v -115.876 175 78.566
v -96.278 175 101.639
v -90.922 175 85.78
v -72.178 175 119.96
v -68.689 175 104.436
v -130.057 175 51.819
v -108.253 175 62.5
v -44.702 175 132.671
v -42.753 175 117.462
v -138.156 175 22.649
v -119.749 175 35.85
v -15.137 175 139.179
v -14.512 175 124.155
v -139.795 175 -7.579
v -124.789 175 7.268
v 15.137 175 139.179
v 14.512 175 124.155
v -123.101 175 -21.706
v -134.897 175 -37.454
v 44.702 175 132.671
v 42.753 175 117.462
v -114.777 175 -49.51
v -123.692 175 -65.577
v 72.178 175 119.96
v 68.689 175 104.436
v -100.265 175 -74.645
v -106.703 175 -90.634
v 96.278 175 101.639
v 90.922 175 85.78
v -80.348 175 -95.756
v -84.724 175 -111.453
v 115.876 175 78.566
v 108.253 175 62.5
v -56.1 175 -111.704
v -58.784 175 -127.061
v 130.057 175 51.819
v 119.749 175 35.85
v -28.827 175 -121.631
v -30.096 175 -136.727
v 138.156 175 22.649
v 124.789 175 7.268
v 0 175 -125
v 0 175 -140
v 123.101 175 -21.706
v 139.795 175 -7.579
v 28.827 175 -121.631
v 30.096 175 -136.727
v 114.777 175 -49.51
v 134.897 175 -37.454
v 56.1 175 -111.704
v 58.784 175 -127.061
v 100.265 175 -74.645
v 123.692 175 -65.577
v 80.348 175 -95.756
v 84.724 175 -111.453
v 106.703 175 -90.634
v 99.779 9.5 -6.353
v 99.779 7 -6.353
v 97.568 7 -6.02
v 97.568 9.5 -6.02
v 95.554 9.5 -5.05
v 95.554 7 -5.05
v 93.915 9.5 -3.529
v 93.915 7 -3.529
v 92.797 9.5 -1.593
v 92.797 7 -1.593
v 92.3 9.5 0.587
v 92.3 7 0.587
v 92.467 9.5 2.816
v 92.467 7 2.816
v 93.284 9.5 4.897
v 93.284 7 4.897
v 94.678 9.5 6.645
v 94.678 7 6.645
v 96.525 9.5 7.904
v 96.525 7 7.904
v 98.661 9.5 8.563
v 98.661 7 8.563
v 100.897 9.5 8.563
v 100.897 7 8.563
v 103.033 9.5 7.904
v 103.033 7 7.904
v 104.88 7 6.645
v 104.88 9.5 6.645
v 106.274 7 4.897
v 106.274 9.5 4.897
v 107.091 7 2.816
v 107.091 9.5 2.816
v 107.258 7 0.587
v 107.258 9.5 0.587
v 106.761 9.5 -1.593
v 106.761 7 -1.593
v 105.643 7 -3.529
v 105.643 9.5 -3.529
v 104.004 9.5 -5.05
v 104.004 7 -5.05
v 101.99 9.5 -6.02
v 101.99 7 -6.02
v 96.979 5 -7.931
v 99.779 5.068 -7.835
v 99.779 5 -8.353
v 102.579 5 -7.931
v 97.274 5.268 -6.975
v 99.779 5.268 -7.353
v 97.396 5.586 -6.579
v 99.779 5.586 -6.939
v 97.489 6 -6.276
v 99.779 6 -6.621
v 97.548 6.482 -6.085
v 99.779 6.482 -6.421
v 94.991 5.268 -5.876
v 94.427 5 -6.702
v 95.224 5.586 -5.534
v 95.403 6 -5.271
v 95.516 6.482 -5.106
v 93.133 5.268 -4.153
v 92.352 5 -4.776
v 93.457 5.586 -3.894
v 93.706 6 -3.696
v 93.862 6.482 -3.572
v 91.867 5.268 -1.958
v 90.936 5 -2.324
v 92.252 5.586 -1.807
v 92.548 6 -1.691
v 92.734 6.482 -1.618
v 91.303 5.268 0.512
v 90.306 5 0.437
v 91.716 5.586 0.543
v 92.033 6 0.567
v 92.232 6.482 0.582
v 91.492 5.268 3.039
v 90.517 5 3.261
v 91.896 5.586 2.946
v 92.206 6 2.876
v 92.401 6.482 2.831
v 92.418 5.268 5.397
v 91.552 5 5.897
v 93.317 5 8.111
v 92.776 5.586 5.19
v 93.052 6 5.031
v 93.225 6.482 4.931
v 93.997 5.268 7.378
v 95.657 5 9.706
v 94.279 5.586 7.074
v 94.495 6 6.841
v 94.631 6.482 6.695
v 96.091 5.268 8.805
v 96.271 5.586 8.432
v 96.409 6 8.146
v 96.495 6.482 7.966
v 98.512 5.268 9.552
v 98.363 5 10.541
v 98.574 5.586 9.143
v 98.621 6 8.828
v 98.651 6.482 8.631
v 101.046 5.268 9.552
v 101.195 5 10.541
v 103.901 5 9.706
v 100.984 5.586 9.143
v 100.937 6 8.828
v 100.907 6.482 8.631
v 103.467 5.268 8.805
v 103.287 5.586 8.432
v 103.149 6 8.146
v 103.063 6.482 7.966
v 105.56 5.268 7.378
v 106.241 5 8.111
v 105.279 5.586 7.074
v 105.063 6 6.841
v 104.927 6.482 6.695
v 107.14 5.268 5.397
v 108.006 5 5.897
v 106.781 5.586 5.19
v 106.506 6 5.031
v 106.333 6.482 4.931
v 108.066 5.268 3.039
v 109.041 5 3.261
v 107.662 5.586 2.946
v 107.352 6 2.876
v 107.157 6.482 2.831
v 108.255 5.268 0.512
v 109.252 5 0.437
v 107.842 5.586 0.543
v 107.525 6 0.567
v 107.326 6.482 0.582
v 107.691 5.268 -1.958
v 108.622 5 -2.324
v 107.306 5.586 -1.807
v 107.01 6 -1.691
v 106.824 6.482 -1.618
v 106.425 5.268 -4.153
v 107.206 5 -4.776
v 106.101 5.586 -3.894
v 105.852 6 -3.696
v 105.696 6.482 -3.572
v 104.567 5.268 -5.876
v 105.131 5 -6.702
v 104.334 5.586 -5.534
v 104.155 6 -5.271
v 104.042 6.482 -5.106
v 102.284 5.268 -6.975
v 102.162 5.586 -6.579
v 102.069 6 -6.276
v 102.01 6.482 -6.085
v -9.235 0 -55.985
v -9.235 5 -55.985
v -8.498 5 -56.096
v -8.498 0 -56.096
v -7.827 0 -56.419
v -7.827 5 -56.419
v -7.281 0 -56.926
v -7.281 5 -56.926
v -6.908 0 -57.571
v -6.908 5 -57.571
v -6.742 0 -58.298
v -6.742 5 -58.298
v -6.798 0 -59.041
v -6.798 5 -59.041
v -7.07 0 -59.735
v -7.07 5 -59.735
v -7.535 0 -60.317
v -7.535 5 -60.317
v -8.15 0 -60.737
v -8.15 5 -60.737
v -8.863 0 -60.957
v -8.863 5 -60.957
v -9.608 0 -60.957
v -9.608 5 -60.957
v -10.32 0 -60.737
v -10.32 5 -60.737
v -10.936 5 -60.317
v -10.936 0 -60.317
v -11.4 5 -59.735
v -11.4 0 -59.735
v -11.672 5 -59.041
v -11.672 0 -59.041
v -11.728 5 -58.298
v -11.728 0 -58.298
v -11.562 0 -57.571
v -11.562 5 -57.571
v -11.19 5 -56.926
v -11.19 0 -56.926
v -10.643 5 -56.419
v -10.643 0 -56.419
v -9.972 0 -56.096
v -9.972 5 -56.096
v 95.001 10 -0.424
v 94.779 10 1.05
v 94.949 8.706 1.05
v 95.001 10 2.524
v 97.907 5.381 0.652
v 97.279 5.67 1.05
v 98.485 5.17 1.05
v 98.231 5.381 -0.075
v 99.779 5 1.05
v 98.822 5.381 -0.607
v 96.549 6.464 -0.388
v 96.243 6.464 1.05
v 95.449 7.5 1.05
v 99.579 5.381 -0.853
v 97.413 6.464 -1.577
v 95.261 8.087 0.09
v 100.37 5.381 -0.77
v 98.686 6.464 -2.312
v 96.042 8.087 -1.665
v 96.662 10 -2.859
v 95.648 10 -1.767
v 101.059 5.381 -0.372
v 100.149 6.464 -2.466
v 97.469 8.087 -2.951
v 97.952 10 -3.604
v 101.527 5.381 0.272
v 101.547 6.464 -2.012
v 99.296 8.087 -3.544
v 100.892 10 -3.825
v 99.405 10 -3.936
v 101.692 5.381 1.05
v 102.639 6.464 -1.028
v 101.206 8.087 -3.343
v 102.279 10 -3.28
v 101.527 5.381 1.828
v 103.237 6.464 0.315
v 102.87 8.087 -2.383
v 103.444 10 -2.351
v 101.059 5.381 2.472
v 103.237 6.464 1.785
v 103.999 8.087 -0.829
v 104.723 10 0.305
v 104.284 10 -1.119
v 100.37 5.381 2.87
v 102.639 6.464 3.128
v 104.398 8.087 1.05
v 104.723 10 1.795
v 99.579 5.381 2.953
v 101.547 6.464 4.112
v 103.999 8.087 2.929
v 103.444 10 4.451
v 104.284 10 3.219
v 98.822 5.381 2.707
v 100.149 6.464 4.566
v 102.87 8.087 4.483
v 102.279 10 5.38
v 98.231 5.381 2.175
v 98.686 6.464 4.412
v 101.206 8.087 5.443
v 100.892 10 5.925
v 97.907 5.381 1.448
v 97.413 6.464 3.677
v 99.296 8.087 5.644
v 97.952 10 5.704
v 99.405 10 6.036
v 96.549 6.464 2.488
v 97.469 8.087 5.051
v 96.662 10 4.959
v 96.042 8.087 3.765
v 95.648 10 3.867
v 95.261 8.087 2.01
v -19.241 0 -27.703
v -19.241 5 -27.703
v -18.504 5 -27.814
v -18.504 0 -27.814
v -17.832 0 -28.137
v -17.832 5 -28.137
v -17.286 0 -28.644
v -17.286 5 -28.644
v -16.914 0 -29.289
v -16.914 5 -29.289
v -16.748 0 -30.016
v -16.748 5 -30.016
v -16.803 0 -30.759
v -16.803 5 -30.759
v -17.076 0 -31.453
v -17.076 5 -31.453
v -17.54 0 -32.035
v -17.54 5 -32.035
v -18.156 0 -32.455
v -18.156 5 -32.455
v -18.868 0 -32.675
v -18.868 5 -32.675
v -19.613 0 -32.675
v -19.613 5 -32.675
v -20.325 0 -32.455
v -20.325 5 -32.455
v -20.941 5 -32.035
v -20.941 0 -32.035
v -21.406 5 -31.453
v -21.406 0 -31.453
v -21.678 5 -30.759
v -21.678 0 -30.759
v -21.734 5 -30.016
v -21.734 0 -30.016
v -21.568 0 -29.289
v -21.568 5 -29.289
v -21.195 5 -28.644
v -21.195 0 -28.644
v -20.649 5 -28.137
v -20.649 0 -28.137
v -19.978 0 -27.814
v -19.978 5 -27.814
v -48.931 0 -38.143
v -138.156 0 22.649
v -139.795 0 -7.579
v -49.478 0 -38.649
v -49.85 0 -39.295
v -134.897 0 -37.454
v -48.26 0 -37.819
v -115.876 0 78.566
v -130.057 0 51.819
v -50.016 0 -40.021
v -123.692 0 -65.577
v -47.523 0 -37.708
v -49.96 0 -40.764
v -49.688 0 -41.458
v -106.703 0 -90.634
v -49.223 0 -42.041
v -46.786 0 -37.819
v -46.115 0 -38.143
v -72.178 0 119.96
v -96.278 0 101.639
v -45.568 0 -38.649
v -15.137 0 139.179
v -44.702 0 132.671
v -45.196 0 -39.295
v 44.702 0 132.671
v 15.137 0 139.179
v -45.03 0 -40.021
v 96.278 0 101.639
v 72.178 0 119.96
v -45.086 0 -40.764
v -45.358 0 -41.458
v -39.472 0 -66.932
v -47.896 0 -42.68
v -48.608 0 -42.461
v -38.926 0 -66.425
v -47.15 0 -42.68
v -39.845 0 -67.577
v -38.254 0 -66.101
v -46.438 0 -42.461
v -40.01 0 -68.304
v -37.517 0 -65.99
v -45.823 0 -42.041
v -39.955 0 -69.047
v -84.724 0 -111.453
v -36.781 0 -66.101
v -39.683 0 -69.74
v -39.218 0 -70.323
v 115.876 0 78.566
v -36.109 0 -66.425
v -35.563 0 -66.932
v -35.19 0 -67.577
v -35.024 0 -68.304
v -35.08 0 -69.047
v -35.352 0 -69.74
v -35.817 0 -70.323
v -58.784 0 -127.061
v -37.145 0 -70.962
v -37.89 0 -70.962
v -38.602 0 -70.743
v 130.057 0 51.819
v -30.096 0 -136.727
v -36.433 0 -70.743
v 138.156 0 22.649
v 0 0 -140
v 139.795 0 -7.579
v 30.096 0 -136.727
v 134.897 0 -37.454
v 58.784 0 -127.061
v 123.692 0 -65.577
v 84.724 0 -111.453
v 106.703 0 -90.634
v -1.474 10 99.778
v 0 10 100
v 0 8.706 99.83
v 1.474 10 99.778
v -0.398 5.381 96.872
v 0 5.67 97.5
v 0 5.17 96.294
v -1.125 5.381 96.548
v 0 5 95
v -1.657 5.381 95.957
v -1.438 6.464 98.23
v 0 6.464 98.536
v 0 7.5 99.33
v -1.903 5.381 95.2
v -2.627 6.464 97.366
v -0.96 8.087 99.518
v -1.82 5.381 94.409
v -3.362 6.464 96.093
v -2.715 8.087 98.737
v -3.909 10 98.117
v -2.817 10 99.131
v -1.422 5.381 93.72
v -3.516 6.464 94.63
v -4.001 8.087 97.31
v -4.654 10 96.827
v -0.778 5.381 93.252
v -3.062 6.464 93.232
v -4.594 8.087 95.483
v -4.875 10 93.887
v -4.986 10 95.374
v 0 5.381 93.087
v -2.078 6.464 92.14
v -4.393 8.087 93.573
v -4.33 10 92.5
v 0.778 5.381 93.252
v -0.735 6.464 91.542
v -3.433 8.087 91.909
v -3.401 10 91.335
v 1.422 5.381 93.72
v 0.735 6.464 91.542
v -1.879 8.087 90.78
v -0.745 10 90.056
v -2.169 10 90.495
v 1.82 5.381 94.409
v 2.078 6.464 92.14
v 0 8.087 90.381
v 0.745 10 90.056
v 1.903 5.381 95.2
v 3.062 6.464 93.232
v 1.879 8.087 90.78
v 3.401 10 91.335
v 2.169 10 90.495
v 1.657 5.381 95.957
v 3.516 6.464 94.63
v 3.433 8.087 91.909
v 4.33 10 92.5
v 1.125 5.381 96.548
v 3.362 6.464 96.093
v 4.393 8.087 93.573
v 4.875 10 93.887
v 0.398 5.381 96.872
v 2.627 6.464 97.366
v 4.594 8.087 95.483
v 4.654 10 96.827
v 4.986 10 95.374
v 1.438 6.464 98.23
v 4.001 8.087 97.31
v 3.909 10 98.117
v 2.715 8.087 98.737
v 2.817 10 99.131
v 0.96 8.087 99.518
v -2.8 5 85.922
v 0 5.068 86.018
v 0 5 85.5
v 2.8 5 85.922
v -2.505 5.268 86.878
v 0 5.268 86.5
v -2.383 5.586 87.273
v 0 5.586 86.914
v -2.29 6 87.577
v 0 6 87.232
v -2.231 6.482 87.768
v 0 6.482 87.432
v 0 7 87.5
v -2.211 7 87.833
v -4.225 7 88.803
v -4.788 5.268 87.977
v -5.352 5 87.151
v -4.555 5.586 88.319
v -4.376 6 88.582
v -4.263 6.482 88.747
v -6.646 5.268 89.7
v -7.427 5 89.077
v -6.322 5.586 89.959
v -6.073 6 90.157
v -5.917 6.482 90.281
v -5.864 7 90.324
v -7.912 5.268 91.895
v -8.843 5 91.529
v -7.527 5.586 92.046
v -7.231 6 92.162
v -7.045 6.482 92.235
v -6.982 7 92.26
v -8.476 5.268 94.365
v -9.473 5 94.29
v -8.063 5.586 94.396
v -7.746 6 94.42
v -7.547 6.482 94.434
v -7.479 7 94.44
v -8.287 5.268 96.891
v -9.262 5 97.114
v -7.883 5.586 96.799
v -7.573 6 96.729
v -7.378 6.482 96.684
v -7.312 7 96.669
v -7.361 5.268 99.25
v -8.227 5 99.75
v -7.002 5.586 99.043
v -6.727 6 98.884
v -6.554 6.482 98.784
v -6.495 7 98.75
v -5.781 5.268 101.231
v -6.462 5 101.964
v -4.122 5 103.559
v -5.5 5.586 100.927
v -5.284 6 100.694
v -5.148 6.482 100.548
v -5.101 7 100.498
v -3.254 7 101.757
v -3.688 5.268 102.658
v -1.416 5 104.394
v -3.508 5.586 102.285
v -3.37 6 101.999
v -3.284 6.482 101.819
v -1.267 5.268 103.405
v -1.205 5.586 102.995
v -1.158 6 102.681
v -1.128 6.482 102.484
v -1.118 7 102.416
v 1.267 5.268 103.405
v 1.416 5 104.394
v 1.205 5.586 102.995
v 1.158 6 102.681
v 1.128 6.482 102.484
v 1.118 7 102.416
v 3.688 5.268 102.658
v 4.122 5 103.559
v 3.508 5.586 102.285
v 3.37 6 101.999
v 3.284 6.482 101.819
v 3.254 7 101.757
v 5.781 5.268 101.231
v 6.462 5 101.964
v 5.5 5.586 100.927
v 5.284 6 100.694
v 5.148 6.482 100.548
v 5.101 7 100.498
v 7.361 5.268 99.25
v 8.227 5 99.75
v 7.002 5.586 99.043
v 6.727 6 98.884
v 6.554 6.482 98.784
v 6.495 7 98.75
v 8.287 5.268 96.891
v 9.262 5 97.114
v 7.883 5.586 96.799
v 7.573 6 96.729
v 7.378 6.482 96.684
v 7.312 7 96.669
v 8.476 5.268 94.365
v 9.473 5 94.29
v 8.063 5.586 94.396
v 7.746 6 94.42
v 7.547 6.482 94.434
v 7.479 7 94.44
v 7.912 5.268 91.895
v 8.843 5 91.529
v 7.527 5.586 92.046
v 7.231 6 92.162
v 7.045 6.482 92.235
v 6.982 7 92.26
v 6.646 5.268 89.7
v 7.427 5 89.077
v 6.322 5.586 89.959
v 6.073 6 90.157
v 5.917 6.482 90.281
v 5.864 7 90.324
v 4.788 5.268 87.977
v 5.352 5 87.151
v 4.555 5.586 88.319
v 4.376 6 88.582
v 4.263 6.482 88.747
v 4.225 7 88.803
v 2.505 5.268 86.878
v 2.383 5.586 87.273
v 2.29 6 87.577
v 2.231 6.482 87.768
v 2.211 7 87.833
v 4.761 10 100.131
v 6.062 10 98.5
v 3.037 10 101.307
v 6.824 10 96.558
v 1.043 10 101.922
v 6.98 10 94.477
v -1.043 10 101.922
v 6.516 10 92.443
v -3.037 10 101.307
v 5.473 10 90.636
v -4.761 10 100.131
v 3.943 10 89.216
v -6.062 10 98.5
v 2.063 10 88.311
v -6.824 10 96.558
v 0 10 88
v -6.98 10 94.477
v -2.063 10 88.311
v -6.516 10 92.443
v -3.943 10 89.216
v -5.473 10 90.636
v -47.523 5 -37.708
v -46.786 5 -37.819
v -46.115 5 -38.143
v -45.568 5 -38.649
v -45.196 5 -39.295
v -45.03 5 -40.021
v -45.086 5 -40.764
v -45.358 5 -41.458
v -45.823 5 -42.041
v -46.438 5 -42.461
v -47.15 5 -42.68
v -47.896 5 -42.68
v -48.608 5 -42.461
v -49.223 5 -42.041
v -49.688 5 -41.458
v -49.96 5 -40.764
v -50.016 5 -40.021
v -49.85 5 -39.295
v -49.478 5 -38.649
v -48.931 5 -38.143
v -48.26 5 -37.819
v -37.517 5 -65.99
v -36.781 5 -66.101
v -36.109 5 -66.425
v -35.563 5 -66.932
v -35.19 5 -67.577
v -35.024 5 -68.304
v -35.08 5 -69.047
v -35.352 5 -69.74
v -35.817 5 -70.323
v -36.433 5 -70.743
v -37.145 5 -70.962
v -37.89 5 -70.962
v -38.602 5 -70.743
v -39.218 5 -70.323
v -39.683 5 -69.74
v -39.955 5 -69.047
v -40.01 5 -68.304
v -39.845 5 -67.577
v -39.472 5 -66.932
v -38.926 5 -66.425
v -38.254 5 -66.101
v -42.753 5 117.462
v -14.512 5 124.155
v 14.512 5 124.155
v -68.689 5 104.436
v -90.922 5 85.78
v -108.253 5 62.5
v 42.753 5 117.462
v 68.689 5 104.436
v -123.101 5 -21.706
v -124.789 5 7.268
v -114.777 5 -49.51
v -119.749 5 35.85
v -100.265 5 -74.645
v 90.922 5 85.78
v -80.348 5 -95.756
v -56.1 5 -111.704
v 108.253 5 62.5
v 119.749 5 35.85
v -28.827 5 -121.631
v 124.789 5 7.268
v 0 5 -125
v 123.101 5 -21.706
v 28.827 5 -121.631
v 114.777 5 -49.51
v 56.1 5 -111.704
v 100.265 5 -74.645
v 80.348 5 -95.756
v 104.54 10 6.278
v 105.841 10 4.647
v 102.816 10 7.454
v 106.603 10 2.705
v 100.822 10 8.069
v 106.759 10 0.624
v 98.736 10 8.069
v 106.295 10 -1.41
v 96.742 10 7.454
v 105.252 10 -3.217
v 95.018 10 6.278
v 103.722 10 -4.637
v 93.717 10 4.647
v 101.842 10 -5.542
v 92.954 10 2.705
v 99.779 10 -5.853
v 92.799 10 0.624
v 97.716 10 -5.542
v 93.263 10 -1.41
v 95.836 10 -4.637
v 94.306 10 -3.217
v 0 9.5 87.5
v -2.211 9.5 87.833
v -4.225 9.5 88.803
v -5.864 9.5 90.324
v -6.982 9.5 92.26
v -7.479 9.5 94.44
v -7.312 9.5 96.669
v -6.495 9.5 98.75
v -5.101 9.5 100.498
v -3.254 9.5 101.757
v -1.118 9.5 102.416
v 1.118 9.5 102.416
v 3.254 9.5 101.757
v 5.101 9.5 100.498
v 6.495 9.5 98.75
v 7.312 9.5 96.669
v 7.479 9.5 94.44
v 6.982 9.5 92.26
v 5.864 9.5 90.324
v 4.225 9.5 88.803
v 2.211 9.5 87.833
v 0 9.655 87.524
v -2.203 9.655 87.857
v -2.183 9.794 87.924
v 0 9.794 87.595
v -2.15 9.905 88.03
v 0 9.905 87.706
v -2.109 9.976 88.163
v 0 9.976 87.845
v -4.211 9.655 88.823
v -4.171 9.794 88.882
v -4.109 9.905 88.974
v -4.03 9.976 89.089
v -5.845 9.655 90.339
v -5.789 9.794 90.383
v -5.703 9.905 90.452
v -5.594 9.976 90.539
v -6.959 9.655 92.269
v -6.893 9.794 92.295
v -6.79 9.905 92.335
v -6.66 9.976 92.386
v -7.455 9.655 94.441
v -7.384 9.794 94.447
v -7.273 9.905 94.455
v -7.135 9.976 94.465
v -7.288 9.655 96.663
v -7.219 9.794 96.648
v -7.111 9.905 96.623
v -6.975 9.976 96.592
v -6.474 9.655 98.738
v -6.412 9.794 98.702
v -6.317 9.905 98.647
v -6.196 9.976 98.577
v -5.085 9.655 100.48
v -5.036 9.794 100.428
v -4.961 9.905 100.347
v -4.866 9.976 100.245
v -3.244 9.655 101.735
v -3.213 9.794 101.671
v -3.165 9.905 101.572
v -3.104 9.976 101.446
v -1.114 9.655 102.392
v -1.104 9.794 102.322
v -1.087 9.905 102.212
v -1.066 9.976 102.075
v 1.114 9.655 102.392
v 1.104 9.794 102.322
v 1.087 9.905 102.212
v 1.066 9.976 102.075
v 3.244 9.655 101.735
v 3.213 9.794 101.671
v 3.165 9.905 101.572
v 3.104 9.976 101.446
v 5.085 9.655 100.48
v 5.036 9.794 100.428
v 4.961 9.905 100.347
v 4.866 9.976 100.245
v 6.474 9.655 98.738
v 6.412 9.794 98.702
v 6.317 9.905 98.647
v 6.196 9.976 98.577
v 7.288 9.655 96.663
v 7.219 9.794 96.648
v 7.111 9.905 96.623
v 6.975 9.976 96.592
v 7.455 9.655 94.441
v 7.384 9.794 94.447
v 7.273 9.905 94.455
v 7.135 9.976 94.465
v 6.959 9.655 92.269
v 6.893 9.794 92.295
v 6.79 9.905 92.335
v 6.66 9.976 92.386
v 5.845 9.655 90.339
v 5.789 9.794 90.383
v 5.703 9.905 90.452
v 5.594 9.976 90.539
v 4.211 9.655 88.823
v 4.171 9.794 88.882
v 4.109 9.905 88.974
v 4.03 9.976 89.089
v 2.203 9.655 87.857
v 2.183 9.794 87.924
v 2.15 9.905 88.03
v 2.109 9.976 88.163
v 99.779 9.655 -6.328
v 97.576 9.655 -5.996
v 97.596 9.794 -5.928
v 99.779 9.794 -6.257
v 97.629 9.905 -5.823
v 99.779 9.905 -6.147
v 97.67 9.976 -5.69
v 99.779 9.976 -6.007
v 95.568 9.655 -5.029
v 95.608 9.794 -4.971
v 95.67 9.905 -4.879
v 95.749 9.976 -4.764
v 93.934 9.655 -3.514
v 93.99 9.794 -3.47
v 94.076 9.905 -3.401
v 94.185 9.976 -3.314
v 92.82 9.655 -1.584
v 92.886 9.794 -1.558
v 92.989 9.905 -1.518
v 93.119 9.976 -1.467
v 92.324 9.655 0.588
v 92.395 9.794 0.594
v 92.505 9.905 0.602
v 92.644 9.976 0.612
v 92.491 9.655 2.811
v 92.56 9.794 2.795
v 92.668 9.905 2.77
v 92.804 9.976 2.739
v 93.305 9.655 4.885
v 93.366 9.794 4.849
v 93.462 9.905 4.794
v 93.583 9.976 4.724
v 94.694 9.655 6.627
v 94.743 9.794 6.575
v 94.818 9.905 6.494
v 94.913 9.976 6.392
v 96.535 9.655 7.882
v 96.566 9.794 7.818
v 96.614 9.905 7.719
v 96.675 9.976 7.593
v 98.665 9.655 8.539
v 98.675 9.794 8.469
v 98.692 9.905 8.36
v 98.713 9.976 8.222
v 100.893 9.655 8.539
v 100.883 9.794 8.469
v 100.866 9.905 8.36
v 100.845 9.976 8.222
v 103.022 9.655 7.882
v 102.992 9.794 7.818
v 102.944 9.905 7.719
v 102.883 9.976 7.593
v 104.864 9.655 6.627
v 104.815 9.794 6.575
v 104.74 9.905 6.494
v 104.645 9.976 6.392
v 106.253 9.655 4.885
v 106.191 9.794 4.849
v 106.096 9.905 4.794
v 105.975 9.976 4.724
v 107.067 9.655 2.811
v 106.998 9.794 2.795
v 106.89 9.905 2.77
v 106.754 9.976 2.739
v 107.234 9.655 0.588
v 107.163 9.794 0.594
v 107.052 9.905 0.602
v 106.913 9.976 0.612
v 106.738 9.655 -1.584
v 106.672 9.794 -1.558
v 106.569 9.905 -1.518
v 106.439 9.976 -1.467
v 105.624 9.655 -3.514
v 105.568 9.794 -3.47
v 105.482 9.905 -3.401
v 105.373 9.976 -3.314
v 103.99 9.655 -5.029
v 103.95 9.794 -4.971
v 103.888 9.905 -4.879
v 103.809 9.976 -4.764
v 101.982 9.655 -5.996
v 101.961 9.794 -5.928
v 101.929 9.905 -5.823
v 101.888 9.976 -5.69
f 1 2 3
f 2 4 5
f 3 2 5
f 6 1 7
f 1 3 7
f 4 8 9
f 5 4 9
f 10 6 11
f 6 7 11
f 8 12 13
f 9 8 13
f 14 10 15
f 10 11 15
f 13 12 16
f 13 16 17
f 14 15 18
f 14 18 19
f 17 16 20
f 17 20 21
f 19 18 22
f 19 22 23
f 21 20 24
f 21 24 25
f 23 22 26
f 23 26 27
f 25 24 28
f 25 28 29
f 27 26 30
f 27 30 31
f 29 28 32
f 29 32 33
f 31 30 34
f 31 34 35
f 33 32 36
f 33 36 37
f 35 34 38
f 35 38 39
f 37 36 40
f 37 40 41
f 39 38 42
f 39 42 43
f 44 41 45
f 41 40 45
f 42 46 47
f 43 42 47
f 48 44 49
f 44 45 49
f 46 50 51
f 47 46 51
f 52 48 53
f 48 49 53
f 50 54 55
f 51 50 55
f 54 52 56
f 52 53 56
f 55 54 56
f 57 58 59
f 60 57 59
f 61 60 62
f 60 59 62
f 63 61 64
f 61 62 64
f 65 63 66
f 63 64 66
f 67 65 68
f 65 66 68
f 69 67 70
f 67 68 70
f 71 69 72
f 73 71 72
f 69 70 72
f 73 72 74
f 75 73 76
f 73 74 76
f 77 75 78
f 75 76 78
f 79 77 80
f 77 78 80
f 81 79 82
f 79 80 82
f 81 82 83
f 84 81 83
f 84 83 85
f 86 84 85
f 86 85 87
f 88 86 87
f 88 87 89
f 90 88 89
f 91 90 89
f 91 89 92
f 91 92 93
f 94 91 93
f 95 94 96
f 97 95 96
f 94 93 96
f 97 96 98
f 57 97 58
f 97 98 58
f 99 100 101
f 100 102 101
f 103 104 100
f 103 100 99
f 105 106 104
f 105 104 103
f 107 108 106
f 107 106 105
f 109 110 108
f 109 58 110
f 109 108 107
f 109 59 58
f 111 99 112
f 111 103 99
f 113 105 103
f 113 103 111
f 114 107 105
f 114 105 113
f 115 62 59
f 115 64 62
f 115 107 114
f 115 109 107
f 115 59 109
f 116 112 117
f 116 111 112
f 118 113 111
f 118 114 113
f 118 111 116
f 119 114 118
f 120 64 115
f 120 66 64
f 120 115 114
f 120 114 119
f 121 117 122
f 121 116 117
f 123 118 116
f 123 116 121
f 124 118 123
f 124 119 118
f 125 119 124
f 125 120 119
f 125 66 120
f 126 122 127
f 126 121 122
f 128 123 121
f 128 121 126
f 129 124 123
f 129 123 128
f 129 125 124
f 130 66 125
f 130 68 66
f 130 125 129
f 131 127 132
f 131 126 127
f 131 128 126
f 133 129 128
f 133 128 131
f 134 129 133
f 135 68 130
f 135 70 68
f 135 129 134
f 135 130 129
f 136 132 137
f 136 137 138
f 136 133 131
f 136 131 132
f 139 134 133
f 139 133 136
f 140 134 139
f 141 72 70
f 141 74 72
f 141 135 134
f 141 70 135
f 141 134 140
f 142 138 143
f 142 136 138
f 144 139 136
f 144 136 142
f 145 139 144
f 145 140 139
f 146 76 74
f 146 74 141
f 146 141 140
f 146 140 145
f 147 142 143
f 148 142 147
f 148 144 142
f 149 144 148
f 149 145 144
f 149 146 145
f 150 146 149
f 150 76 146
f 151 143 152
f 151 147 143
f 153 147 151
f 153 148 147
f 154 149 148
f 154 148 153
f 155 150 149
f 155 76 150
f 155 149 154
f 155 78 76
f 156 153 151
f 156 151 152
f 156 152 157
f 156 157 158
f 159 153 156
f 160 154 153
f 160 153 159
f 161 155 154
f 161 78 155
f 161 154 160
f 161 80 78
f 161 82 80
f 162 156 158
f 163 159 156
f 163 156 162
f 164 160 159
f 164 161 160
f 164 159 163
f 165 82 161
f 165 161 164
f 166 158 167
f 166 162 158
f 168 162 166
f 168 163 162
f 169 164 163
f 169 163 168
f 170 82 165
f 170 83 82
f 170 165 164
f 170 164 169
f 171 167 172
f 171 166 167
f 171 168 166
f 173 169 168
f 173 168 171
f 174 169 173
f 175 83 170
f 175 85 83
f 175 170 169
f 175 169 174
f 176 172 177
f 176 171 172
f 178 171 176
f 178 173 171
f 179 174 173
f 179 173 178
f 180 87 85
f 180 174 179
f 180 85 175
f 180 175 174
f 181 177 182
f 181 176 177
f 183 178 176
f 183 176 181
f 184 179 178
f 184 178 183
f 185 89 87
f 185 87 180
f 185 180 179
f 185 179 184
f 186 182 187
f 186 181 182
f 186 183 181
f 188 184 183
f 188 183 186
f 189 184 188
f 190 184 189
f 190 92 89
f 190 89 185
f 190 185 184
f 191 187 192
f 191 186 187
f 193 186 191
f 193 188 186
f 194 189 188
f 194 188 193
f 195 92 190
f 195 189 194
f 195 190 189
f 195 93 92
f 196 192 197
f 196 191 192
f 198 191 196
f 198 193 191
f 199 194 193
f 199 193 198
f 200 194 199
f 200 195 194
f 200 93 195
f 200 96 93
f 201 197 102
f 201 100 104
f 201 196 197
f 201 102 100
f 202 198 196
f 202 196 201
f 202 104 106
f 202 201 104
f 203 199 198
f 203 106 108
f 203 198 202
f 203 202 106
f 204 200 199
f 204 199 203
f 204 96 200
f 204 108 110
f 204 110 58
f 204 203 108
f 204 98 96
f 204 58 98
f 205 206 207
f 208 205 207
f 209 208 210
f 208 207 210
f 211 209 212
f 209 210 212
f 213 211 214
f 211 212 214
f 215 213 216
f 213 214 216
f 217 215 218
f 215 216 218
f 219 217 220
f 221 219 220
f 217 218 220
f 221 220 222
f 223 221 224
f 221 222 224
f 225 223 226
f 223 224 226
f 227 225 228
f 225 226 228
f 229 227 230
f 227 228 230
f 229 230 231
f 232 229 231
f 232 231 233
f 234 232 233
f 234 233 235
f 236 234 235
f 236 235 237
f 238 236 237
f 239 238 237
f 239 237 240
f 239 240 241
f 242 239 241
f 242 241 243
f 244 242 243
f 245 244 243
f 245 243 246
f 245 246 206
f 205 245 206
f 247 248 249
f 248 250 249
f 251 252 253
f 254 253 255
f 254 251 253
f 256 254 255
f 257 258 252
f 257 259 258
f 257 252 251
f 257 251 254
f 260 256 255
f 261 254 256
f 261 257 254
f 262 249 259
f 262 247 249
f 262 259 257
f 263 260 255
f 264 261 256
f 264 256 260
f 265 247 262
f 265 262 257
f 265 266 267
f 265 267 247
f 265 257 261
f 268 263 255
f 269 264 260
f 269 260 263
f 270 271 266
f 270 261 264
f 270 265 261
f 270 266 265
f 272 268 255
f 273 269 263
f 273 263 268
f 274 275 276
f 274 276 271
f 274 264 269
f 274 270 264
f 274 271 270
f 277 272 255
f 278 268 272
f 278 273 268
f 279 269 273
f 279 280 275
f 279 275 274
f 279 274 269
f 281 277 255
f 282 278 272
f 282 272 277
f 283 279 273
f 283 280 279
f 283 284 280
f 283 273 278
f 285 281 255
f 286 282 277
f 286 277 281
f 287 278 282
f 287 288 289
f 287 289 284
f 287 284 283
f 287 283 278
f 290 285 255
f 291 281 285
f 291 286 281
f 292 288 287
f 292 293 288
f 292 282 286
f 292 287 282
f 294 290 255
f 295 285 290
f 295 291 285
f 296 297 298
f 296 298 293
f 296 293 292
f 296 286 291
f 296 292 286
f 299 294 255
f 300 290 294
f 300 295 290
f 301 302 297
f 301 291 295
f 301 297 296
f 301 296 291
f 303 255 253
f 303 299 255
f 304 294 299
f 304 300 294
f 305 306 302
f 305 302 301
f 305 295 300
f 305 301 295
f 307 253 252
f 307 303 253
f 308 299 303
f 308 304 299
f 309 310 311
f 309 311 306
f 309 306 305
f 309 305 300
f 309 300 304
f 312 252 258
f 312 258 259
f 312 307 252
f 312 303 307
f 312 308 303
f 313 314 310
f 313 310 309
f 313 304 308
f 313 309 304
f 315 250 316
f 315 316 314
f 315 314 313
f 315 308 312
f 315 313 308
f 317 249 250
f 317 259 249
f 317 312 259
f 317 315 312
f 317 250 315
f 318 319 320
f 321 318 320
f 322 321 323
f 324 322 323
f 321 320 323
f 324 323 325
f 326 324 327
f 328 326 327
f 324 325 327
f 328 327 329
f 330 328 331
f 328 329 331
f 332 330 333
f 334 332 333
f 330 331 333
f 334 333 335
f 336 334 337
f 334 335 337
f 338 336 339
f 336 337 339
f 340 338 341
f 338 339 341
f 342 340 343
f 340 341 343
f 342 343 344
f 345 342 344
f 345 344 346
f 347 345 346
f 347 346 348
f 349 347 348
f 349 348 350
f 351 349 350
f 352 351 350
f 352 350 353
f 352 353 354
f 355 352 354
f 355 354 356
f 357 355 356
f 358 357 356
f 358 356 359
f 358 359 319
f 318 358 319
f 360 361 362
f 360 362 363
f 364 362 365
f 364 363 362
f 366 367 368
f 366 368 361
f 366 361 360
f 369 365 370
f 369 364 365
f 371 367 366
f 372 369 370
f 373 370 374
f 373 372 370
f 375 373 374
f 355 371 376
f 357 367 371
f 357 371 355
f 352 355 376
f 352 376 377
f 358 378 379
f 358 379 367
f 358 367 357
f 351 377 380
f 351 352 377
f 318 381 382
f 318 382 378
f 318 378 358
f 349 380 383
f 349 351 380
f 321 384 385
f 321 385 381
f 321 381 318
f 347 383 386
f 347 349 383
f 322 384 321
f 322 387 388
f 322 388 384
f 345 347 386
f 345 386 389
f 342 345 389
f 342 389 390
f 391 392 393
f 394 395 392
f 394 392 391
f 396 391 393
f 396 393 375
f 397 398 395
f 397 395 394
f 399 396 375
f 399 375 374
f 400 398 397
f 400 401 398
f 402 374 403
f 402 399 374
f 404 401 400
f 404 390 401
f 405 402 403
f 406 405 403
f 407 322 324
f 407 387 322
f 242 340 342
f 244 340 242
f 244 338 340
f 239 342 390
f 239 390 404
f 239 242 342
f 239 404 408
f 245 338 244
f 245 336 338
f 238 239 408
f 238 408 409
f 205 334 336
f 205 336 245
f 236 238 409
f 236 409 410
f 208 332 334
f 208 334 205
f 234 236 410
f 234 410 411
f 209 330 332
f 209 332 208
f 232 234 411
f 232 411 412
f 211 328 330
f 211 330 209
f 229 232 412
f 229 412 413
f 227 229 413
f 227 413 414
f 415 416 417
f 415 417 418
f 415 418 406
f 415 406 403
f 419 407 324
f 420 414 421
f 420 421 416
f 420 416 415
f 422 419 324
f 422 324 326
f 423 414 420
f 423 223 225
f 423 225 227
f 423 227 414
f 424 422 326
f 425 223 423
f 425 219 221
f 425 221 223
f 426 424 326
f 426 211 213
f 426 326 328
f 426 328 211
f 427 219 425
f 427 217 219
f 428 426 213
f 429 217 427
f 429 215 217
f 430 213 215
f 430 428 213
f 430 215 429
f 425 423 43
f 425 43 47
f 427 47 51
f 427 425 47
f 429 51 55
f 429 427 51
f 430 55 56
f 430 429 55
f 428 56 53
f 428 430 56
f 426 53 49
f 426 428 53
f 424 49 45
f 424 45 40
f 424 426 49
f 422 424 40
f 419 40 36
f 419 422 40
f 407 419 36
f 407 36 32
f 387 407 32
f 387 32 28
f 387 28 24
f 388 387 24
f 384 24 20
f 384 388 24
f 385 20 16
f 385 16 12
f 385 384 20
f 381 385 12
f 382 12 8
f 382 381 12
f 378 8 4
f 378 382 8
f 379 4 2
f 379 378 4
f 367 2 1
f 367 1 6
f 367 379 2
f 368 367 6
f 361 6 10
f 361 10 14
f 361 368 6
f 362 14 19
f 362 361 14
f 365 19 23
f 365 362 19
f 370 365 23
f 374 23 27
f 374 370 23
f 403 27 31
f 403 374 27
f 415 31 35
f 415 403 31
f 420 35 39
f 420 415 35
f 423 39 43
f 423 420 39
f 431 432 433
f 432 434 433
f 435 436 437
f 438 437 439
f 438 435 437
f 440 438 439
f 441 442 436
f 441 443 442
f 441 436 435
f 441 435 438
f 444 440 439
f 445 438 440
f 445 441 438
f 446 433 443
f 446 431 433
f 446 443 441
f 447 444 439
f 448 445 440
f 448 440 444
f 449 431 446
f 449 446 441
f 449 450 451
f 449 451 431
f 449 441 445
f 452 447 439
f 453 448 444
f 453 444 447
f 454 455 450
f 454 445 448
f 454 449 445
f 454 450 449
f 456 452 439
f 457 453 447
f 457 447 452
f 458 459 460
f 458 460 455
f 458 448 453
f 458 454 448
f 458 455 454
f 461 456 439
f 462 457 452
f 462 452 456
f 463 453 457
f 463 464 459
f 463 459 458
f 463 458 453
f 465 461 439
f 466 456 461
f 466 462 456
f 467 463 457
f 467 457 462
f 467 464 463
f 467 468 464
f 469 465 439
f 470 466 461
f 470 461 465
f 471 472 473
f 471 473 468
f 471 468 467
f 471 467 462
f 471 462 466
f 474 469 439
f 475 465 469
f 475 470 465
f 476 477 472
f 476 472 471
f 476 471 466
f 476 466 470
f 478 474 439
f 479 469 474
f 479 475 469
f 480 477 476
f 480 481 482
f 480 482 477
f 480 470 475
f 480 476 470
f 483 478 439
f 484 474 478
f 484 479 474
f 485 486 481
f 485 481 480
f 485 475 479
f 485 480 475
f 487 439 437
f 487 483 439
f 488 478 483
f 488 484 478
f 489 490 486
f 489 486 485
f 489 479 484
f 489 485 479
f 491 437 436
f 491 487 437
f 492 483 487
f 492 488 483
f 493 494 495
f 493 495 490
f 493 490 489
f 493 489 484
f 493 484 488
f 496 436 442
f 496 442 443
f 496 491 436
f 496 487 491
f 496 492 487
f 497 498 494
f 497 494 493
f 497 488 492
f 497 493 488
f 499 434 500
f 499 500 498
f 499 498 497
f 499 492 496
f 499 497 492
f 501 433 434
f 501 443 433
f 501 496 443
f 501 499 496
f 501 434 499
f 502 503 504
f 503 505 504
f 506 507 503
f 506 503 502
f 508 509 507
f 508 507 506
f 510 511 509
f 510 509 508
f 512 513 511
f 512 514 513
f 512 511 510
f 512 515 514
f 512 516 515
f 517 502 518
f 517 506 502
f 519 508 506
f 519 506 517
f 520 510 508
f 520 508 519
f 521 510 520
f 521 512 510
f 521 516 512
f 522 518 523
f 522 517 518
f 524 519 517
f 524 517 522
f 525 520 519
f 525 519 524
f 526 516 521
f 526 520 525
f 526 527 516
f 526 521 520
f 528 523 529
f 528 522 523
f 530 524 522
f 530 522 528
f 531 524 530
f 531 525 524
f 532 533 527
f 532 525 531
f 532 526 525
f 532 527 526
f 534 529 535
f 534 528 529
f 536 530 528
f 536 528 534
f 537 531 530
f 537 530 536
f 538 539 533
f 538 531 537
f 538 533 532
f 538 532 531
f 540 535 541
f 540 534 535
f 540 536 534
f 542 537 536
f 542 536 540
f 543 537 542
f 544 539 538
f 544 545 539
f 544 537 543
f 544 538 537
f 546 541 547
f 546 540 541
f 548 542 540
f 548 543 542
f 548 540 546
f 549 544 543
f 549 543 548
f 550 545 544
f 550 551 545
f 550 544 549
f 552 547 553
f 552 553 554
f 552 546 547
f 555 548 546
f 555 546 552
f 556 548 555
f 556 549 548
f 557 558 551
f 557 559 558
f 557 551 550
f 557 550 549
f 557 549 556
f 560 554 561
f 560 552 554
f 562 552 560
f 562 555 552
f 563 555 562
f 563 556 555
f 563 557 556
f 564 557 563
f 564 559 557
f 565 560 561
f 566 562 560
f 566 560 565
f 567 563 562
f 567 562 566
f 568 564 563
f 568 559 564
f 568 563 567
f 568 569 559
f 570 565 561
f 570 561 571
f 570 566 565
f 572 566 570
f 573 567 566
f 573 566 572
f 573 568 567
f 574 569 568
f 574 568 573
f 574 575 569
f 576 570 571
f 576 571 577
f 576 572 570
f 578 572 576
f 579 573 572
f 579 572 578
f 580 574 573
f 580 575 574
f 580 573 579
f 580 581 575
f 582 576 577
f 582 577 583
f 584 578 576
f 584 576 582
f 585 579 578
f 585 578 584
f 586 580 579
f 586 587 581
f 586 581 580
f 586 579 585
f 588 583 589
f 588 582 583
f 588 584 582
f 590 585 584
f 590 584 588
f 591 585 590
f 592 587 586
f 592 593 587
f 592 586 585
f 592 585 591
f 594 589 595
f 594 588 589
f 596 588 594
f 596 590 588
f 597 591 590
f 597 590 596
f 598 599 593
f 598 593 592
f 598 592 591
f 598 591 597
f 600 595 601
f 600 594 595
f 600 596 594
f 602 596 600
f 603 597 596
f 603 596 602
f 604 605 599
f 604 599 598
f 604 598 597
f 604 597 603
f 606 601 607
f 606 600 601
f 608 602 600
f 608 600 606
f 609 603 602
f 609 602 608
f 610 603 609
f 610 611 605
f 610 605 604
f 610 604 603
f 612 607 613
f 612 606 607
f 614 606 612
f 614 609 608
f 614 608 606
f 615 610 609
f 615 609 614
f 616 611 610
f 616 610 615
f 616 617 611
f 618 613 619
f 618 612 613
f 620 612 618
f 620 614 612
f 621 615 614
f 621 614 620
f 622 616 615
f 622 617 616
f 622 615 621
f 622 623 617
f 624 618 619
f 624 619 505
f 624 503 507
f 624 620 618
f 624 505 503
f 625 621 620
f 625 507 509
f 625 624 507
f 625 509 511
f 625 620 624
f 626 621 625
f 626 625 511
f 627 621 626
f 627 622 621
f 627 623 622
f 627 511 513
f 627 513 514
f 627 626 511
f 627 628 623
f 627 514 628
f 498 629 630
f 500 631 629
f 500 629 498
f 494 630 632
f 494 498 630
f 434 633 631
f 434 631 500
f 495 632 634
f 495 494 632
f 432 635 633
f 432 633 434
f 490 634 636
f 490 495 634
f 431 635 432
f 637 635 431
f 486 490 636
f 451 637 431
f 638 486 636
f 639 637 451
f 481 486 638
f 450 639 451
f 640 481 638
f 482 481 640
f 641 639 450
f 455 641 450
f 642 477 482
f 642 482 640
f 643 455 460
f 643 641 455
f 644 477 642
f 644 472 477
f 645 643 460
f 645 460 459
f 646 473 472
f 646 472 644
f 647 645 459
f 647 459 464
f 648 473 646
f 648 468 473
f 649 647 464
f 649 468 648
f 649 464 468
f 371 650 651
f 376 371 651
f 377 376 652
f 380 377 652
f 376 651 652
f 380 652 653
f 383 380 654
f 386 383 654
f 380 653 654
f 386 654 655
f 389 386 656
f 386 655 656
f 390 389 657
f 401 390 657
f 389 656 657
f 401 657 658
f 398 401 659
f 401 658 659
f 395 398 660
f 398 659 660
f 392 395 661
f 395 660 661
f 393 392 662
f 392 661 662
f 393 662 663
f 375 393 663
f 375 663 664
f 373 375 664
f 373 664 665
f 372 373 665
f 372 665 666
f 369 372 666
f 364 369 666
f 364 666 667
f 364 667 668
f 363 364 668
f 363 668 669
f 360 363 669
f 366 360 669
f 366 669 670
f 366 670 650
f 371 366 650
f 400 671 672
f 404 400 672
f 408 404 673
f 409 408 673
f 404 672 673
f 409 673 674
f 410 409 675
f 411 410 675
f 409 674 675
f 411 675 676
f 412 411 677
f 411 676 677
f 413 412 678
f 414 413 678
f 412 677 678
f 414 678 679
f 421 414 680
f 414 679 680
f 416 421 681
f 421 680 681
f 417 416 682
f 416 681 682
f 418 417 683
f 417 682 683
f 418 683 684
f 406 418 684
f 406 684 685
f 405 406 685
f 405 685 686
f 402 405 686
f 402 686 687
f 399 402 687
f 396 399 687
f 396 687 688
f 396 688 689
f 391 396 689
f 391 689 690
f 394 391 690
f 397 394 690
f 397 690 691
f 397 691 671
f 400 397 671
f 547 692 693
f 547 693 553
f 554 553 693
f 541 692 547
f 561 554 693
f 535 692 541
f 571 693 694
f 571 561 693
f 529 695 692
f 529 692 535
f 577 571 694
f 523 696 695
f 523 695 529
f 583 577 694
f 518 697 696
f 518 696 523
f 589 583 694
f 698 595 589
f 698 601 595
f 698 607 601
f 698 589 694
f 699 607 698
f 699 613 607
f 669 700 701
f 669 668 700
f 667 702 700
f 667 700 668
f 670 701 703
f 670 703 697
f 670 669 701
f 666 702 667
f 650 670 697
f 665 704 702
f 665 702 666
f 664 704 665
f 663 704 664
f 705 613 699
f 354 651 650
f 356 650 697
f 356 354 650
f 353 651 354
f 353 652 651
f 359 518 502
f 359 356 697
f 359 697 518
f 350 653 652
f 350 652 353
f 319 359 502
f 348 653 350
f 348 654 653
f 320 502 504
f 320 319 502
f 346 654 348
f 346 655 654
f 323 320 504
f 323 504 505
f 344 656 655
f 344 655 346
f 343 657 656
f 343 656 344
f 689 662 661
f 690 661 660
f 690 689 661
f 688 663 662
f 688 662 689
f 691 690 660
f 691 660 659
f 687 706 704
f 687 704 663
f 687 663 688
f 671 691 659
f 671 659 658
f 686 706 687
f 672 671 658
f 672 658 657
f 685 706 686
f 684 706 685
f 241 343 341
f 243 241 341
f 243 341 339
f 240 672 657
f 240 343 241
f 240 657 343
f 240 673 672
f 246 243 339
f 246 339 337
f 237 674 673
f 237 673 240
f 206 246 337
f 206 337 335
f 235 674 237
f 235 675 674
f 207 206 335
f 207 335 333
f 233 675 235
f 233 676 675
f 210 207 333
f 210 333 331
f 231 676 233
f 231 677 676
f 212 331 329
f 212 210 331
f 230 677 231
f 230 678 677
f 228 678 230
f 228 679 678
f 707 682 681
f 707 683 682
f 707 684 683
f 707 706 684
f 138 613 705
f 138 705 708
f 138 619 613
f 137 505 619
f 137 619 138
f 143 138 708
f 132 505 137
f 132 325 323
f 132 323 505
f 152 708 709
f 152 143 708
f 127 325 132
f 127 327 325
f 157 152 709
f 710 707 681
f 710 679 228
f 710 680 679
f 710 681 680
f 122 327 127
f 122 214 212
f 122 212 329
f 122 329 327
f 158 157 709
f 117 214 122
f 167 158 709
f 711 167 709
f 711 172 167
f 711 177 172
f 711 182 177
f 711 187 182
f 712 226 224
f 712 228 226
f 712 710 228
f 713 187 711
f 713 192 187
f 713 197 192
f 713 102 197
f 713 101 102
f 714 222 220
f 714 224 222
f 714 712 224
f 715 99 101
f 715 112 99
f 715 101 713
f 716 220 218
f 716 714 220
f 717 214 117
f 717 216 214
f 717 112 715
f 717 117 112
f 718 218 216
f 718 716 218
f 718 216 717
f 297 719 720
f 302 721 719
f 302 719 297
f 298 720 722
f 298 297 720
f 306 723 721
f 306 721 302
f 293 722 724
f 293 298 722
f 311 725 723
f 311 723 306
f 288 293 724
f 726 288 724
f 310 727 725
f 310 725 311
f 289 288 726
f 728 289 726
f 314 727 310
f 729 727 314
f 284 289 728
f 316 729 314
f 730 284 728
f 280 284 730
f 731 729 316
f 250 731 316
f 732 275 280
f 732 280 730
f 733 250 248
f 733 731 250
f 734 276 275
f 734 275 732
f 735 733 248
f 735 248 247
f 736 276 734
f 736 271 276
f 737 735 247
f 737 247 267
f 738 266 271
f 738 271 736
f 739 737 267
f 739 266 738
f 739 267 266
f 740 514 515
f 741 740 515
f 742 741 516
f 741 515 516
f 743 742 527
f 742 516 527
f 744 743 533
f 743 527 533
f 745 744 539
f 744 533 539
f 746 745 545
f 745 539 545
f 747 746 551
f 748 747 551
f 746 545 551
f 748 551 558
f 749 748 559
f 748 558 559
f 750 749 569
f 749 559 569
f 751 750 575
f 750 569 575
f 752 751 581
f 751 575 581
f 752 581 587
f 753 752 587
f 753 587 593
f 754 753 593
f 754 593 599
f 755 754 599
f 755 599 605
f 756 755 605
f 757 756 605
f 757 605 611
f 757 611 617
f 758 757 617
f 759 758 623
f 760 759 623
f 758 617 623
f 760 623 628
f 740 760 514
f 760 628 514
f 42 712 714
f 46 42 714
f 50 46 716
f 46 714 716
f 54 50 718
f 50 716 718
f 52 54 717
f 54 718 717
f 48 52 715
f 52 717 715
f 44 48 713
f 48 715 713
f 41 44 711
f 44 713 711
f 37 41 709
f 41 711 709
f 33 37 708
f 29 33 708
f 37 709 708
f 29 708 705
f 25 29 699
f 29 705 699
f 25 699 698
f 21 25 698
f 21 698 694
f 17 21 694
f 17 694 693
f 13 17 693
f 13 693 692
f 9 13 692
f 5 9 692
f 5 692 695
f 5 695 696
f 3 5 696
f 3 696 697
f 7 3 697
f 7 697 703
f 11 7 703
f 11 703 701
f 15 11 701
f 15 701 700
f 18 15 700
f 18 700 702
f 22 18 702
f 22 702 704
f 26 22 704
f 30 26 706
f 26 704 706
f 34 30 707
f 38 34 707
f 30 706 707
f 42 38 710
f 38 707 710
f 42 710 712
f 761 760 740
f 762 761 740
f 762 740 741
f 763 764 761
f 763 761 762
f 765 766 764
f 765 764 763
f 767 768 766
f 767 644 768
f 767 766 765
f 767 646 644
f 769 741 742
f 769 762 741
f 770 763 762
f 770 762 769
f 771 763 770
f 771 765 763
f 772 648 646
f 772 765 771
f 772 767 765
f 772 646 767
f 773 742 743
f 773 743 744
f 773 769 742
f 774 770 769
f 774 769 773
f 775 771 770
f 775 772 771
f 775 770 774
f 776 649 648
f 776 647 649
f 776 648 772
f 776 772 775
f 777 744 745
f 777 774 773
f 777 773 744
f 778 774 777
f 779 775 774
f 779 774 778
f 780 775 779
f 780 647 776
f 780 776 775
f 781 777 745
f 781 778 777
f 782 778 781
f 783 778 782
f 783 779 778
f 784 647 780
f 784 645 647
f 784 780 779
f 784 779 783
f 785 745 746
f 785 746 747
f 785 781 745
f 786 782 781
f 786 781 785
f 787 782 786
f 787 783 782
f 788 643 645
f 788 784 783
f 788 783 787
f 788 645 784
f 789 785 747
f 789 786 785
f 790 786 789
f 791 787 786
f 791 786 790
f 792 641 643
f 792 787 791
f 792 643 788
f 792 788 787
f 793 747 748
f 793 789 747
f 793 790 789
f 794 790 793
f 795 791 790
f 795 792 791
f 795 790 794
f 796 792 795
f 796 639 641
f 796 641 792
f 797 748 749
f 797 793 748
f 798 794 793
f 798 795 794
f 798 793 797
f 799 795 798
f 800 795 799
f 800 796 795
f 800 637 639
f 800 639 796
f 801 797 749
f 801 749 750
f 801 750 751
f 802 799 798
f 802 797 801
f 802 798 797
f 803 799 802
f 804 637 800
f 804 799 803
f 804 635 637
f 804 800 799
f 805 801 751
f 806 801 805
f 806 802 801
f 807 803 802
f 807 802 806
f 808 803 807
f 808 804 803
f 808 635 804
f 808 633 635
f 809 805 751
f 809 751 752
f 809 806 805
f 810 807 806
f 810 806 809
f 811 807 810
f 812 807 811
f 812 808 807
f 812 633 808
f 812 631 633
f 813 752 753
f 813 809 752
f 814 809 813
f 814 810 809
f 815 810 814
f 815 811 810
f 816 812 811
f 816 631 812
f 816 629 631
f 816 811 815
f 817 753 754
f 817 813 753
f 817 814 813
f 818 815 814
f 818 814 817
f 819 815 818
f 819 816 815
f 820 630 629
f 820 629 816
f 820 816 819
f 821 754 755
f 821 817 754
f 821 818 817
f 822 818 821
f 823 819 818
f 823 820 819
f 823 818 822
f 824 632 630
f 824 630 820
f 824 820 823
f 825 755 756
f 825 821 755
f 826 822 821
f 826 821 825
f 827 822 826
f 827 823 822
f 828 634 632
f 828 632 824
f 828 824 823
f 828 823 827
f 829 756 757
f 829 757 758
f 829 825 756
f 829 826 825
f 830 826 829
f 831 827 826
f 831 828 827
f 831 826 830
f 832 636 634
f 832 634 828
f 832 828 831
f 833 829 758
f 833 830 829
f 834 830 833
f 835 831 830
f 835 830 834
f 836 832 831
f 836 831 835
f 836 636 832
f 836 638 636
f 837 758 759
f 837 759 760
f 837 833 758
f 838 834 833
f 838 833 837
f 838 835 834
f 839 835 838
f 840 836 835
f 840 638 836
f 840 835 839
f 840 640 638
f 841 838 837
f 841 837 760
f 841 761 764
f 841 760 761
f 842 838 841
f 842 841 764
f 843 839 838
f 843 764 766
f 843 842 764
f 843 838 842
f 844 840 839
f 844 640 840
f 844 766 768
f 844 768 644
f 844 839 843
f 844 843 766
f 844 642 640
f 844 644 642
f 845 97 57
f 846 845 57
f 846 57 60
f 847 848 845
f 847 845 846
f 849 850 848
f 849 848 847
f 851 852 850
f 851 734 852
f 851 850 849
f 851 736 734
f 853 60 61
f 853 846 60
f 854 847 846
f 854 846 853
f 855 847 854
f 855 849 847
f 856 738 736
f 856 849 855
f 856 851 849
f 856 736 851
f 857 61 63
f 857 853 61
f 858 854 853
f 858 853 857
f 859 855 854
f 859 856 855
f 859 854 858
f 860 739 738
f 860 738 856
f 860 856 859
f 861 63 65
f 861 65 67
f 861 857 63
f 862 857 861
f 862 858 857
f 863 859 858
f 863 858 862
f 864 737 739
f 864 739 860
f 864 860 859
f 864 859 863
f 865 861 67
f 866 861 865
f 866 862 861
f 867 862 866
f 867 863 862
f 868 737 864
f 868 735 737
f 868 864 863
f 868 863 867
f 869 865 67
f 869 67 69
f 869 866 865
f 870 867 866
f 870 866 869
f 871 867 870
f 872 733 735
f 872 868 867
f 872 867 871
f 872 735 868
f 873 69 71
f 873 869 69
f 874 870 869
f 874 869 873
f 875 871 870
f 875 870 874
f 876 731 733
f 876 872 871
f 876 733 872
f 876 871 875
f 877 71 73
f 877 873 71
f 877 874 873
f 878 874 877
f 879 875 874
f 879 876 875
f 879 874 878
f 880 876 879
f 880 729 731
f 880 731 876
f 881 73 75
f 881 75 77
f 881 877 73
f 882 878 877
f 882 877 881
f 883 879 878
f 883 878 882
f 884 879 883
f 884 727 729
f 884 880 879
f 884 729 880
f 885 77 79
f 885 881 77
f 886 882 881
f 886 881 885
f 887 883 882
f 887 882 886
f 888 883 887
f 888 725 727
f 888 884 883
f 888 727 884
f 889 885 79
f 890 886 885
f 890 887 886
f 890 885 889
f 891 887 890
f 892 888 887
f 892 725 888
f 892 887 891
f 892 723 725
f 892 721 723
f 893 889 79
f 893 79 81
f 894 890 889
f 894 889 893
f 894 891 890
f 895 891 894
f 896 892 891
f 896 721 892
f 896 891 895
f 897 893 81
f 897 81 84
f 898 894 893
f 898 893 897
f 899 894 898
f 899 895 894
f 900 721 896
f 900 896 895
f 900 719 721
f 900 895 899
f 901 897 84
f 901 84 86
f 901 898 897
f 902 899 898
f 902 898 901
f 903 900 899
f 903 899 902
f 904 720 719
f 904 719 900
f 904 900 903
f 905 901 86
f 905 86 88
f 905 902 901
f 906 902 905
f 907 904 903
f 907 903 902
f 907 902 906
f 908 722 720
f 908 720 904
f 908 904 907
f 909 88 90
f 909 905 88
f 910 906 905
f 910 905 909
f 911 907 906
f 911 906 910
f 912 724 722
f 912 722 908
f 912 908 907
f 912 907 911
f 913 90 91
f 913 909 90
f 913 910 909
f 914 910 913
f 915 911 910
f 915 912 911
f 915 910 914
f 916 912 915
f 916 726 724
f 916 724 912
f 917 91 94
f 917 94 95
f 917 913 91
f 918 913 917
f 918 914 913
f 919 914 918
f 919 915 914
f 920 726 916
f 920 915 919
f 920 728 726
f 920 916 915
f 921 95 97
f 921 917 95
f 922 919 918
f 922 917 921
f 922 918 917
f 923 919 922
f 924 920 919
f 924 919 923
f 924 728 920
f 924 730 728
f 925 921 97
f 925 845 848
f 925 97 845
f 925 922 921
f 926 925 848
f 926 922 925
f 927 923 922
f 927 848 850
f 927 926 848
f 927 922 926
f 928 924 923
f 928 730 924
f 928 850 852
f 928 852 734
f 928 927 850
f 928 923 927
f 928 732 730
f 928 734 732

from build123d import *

# Parameters (mm, degrees)
SKETCH1_W           = 250
SKETCH1_H           = 250
BOSS_EXTRUDE1_DEPTH = 5
SKETCH8_R           = 7.5
BOSS_EXTRUDE3_DEPTH = 5
FILLET6_R           = 2
FILLET7_R           = 0.5
SKETCH11_R          = 2.5
CUT_EXTRUDE4_DEPTH  = 10
SKETCH12_OUTSIDE_W  = 322.738
SKETCH12_OUTSIDE_H  = 322.738
SKETCH12_OUTSIDE_R  = 125
CUT_EXTRUDE5_DEPTH  = 10
SKETCH13_R          = 140
SKETCH13_R_2        = 125
BOSS_EXTRUDE4_DEPTH = 175


with BuildPart() as part:
    # Sketch1 → Boss-Extrude1 (new body)
    with BuildSketch(Plane(origin=(0, 0, 0), x_dir=(1, 0, 0), z_dir=(0, 1, 0))):
        Rectangle(SKETCH1_W, SKETCH1_H)
    extrude(amount=BOSS_EXTRUDE1_DEPTH)

    # Sketch8 → Boss-Extrude3 (add)
    with BuildSketch(Plane(origin=(0, 5, 0), x_dir=(1, 0, 0), z_dir=(0, 1, 0))):
        with Locations(Location((99.778960279, -1.147118049, 0), (0, 0, 90))):
            Circle(SKETCH8_R)
        with Locations(Location((0, -95, 0), (0, 0, 90))):
            Circle(SKETCH8_R)
    extrude(amount=BOSS_EXTRUDE3_DEPTH)

    # Sketch9 → Cut-Revolve3 (revolve, cut)
    with BuildSketch(Plane(origin=(0, 0, 0), x_dir=(0, 0, -1), z_dir=(1, 0, 0))):
        with BuildLine():
            Line((-95, 15), (-95, 5))
            ThreePointArc((-95, 5), (-100, 10), (-95, 15))
        make_face()
    revolve(axis=Axis((0, 10, 95), (0, -1, 0)), mode=Mode.SUBTRACT)

    # Sketch10 → Cut-Revolve4 (revolve, cut)
    with BuildSketch(Plane.XY.offset(1.05)):
        with BuildLine():
            Line((99.778960279, 15), (99.778960279, 5))
            ThreePointArc((99.778960279, 5), (94.778960279, 10), (99.778960279, 15))
        make_face()
    revolve(axis=Axis((99.778960279, 15, 1.05), (0, -1, 0)), mode=Mode.SUBTRACT)

    # Fillet6
    fillet6_edges = [part.edges().sort_by_distance(p)[0] for p in [
        (99.778960279, 5, 8.647118049),
        (0, 5, 102.5),
    ]]
    fillet(fillet6_edges, radius=FILLET6_R)

    # Fillet7
    fillet7_edges = [part.edges().sort_by_distance(p)[0] for p in [
        (99.778960279, 10, 8.647118049),
        (0, 10, 102.5),
    ]]
    fillet(fillet7_edges, radius=FILLET7_R)

    # Sketch11 → Cut-Extrude4 (cut)
    with BuildSketch(Plane(origin=(0, 5, 0), x_dir=(1, 0, 0), z_dir=(0, 1, 0))):
        with Locations(Location((-19.240698593, 30.202545091, 0), (0, 0, 270))):
            Circle(SKETCH11_R)
        with Locations(Location((-37.517445985, 68.490408766, 0), (0, 0, 270))):
            Circle(SKETCH11_R)
        with Locations(Location((-47.523004126, 40.208103233, 0), (0, 0, 270))):
            Circle(SKETCH11_R)
        with Locations(Location((-9.235140451, 58.484850625, 0), (0, 0, 270))):
            Circle(SKETCH11_R)
    extrude(amount=-CUT_EXTRUDE4_DEPTH, mode=Mode.SUBTRACT)

    # Sketch12 outside → Cut-Extrude5 (cut)
    with BuildSketch(Plane(origin=(0, 0, 0), x_dir=(-1, 0, 0), z_dir=(0, -1, 0))):
        Rectangle(SKETCH12_OUTSIDE_W, SKETCH12_OUTSIDE_H)
        with Locations(Location((0, 0, 0), (0, 0, 90))):
            Circle(SKETCH12_OUTSIDE_R, mode=Mode.SUBTRACT)
    extrude(amount=-CUT_EXTRUDE5_DEPTH, mode=Mode.SUBTRACT)

    # Sketch13 → Boss-Extrude4 (add)
    with BuildSketch(Plane.XZ):
        with Locations(Location((0, 0, 0), (0, 0, 270))):
            Circle(SKETCH13_R)
        with Locations(Location((0, 0, 0), (0, 0, 270))):
            Circle(SKETCH13_R_2, mode=Mode.SUBTRACT)
    extrude(amount=-BOSS_EXTRUDE4_DEPTH)


solid = part.part
